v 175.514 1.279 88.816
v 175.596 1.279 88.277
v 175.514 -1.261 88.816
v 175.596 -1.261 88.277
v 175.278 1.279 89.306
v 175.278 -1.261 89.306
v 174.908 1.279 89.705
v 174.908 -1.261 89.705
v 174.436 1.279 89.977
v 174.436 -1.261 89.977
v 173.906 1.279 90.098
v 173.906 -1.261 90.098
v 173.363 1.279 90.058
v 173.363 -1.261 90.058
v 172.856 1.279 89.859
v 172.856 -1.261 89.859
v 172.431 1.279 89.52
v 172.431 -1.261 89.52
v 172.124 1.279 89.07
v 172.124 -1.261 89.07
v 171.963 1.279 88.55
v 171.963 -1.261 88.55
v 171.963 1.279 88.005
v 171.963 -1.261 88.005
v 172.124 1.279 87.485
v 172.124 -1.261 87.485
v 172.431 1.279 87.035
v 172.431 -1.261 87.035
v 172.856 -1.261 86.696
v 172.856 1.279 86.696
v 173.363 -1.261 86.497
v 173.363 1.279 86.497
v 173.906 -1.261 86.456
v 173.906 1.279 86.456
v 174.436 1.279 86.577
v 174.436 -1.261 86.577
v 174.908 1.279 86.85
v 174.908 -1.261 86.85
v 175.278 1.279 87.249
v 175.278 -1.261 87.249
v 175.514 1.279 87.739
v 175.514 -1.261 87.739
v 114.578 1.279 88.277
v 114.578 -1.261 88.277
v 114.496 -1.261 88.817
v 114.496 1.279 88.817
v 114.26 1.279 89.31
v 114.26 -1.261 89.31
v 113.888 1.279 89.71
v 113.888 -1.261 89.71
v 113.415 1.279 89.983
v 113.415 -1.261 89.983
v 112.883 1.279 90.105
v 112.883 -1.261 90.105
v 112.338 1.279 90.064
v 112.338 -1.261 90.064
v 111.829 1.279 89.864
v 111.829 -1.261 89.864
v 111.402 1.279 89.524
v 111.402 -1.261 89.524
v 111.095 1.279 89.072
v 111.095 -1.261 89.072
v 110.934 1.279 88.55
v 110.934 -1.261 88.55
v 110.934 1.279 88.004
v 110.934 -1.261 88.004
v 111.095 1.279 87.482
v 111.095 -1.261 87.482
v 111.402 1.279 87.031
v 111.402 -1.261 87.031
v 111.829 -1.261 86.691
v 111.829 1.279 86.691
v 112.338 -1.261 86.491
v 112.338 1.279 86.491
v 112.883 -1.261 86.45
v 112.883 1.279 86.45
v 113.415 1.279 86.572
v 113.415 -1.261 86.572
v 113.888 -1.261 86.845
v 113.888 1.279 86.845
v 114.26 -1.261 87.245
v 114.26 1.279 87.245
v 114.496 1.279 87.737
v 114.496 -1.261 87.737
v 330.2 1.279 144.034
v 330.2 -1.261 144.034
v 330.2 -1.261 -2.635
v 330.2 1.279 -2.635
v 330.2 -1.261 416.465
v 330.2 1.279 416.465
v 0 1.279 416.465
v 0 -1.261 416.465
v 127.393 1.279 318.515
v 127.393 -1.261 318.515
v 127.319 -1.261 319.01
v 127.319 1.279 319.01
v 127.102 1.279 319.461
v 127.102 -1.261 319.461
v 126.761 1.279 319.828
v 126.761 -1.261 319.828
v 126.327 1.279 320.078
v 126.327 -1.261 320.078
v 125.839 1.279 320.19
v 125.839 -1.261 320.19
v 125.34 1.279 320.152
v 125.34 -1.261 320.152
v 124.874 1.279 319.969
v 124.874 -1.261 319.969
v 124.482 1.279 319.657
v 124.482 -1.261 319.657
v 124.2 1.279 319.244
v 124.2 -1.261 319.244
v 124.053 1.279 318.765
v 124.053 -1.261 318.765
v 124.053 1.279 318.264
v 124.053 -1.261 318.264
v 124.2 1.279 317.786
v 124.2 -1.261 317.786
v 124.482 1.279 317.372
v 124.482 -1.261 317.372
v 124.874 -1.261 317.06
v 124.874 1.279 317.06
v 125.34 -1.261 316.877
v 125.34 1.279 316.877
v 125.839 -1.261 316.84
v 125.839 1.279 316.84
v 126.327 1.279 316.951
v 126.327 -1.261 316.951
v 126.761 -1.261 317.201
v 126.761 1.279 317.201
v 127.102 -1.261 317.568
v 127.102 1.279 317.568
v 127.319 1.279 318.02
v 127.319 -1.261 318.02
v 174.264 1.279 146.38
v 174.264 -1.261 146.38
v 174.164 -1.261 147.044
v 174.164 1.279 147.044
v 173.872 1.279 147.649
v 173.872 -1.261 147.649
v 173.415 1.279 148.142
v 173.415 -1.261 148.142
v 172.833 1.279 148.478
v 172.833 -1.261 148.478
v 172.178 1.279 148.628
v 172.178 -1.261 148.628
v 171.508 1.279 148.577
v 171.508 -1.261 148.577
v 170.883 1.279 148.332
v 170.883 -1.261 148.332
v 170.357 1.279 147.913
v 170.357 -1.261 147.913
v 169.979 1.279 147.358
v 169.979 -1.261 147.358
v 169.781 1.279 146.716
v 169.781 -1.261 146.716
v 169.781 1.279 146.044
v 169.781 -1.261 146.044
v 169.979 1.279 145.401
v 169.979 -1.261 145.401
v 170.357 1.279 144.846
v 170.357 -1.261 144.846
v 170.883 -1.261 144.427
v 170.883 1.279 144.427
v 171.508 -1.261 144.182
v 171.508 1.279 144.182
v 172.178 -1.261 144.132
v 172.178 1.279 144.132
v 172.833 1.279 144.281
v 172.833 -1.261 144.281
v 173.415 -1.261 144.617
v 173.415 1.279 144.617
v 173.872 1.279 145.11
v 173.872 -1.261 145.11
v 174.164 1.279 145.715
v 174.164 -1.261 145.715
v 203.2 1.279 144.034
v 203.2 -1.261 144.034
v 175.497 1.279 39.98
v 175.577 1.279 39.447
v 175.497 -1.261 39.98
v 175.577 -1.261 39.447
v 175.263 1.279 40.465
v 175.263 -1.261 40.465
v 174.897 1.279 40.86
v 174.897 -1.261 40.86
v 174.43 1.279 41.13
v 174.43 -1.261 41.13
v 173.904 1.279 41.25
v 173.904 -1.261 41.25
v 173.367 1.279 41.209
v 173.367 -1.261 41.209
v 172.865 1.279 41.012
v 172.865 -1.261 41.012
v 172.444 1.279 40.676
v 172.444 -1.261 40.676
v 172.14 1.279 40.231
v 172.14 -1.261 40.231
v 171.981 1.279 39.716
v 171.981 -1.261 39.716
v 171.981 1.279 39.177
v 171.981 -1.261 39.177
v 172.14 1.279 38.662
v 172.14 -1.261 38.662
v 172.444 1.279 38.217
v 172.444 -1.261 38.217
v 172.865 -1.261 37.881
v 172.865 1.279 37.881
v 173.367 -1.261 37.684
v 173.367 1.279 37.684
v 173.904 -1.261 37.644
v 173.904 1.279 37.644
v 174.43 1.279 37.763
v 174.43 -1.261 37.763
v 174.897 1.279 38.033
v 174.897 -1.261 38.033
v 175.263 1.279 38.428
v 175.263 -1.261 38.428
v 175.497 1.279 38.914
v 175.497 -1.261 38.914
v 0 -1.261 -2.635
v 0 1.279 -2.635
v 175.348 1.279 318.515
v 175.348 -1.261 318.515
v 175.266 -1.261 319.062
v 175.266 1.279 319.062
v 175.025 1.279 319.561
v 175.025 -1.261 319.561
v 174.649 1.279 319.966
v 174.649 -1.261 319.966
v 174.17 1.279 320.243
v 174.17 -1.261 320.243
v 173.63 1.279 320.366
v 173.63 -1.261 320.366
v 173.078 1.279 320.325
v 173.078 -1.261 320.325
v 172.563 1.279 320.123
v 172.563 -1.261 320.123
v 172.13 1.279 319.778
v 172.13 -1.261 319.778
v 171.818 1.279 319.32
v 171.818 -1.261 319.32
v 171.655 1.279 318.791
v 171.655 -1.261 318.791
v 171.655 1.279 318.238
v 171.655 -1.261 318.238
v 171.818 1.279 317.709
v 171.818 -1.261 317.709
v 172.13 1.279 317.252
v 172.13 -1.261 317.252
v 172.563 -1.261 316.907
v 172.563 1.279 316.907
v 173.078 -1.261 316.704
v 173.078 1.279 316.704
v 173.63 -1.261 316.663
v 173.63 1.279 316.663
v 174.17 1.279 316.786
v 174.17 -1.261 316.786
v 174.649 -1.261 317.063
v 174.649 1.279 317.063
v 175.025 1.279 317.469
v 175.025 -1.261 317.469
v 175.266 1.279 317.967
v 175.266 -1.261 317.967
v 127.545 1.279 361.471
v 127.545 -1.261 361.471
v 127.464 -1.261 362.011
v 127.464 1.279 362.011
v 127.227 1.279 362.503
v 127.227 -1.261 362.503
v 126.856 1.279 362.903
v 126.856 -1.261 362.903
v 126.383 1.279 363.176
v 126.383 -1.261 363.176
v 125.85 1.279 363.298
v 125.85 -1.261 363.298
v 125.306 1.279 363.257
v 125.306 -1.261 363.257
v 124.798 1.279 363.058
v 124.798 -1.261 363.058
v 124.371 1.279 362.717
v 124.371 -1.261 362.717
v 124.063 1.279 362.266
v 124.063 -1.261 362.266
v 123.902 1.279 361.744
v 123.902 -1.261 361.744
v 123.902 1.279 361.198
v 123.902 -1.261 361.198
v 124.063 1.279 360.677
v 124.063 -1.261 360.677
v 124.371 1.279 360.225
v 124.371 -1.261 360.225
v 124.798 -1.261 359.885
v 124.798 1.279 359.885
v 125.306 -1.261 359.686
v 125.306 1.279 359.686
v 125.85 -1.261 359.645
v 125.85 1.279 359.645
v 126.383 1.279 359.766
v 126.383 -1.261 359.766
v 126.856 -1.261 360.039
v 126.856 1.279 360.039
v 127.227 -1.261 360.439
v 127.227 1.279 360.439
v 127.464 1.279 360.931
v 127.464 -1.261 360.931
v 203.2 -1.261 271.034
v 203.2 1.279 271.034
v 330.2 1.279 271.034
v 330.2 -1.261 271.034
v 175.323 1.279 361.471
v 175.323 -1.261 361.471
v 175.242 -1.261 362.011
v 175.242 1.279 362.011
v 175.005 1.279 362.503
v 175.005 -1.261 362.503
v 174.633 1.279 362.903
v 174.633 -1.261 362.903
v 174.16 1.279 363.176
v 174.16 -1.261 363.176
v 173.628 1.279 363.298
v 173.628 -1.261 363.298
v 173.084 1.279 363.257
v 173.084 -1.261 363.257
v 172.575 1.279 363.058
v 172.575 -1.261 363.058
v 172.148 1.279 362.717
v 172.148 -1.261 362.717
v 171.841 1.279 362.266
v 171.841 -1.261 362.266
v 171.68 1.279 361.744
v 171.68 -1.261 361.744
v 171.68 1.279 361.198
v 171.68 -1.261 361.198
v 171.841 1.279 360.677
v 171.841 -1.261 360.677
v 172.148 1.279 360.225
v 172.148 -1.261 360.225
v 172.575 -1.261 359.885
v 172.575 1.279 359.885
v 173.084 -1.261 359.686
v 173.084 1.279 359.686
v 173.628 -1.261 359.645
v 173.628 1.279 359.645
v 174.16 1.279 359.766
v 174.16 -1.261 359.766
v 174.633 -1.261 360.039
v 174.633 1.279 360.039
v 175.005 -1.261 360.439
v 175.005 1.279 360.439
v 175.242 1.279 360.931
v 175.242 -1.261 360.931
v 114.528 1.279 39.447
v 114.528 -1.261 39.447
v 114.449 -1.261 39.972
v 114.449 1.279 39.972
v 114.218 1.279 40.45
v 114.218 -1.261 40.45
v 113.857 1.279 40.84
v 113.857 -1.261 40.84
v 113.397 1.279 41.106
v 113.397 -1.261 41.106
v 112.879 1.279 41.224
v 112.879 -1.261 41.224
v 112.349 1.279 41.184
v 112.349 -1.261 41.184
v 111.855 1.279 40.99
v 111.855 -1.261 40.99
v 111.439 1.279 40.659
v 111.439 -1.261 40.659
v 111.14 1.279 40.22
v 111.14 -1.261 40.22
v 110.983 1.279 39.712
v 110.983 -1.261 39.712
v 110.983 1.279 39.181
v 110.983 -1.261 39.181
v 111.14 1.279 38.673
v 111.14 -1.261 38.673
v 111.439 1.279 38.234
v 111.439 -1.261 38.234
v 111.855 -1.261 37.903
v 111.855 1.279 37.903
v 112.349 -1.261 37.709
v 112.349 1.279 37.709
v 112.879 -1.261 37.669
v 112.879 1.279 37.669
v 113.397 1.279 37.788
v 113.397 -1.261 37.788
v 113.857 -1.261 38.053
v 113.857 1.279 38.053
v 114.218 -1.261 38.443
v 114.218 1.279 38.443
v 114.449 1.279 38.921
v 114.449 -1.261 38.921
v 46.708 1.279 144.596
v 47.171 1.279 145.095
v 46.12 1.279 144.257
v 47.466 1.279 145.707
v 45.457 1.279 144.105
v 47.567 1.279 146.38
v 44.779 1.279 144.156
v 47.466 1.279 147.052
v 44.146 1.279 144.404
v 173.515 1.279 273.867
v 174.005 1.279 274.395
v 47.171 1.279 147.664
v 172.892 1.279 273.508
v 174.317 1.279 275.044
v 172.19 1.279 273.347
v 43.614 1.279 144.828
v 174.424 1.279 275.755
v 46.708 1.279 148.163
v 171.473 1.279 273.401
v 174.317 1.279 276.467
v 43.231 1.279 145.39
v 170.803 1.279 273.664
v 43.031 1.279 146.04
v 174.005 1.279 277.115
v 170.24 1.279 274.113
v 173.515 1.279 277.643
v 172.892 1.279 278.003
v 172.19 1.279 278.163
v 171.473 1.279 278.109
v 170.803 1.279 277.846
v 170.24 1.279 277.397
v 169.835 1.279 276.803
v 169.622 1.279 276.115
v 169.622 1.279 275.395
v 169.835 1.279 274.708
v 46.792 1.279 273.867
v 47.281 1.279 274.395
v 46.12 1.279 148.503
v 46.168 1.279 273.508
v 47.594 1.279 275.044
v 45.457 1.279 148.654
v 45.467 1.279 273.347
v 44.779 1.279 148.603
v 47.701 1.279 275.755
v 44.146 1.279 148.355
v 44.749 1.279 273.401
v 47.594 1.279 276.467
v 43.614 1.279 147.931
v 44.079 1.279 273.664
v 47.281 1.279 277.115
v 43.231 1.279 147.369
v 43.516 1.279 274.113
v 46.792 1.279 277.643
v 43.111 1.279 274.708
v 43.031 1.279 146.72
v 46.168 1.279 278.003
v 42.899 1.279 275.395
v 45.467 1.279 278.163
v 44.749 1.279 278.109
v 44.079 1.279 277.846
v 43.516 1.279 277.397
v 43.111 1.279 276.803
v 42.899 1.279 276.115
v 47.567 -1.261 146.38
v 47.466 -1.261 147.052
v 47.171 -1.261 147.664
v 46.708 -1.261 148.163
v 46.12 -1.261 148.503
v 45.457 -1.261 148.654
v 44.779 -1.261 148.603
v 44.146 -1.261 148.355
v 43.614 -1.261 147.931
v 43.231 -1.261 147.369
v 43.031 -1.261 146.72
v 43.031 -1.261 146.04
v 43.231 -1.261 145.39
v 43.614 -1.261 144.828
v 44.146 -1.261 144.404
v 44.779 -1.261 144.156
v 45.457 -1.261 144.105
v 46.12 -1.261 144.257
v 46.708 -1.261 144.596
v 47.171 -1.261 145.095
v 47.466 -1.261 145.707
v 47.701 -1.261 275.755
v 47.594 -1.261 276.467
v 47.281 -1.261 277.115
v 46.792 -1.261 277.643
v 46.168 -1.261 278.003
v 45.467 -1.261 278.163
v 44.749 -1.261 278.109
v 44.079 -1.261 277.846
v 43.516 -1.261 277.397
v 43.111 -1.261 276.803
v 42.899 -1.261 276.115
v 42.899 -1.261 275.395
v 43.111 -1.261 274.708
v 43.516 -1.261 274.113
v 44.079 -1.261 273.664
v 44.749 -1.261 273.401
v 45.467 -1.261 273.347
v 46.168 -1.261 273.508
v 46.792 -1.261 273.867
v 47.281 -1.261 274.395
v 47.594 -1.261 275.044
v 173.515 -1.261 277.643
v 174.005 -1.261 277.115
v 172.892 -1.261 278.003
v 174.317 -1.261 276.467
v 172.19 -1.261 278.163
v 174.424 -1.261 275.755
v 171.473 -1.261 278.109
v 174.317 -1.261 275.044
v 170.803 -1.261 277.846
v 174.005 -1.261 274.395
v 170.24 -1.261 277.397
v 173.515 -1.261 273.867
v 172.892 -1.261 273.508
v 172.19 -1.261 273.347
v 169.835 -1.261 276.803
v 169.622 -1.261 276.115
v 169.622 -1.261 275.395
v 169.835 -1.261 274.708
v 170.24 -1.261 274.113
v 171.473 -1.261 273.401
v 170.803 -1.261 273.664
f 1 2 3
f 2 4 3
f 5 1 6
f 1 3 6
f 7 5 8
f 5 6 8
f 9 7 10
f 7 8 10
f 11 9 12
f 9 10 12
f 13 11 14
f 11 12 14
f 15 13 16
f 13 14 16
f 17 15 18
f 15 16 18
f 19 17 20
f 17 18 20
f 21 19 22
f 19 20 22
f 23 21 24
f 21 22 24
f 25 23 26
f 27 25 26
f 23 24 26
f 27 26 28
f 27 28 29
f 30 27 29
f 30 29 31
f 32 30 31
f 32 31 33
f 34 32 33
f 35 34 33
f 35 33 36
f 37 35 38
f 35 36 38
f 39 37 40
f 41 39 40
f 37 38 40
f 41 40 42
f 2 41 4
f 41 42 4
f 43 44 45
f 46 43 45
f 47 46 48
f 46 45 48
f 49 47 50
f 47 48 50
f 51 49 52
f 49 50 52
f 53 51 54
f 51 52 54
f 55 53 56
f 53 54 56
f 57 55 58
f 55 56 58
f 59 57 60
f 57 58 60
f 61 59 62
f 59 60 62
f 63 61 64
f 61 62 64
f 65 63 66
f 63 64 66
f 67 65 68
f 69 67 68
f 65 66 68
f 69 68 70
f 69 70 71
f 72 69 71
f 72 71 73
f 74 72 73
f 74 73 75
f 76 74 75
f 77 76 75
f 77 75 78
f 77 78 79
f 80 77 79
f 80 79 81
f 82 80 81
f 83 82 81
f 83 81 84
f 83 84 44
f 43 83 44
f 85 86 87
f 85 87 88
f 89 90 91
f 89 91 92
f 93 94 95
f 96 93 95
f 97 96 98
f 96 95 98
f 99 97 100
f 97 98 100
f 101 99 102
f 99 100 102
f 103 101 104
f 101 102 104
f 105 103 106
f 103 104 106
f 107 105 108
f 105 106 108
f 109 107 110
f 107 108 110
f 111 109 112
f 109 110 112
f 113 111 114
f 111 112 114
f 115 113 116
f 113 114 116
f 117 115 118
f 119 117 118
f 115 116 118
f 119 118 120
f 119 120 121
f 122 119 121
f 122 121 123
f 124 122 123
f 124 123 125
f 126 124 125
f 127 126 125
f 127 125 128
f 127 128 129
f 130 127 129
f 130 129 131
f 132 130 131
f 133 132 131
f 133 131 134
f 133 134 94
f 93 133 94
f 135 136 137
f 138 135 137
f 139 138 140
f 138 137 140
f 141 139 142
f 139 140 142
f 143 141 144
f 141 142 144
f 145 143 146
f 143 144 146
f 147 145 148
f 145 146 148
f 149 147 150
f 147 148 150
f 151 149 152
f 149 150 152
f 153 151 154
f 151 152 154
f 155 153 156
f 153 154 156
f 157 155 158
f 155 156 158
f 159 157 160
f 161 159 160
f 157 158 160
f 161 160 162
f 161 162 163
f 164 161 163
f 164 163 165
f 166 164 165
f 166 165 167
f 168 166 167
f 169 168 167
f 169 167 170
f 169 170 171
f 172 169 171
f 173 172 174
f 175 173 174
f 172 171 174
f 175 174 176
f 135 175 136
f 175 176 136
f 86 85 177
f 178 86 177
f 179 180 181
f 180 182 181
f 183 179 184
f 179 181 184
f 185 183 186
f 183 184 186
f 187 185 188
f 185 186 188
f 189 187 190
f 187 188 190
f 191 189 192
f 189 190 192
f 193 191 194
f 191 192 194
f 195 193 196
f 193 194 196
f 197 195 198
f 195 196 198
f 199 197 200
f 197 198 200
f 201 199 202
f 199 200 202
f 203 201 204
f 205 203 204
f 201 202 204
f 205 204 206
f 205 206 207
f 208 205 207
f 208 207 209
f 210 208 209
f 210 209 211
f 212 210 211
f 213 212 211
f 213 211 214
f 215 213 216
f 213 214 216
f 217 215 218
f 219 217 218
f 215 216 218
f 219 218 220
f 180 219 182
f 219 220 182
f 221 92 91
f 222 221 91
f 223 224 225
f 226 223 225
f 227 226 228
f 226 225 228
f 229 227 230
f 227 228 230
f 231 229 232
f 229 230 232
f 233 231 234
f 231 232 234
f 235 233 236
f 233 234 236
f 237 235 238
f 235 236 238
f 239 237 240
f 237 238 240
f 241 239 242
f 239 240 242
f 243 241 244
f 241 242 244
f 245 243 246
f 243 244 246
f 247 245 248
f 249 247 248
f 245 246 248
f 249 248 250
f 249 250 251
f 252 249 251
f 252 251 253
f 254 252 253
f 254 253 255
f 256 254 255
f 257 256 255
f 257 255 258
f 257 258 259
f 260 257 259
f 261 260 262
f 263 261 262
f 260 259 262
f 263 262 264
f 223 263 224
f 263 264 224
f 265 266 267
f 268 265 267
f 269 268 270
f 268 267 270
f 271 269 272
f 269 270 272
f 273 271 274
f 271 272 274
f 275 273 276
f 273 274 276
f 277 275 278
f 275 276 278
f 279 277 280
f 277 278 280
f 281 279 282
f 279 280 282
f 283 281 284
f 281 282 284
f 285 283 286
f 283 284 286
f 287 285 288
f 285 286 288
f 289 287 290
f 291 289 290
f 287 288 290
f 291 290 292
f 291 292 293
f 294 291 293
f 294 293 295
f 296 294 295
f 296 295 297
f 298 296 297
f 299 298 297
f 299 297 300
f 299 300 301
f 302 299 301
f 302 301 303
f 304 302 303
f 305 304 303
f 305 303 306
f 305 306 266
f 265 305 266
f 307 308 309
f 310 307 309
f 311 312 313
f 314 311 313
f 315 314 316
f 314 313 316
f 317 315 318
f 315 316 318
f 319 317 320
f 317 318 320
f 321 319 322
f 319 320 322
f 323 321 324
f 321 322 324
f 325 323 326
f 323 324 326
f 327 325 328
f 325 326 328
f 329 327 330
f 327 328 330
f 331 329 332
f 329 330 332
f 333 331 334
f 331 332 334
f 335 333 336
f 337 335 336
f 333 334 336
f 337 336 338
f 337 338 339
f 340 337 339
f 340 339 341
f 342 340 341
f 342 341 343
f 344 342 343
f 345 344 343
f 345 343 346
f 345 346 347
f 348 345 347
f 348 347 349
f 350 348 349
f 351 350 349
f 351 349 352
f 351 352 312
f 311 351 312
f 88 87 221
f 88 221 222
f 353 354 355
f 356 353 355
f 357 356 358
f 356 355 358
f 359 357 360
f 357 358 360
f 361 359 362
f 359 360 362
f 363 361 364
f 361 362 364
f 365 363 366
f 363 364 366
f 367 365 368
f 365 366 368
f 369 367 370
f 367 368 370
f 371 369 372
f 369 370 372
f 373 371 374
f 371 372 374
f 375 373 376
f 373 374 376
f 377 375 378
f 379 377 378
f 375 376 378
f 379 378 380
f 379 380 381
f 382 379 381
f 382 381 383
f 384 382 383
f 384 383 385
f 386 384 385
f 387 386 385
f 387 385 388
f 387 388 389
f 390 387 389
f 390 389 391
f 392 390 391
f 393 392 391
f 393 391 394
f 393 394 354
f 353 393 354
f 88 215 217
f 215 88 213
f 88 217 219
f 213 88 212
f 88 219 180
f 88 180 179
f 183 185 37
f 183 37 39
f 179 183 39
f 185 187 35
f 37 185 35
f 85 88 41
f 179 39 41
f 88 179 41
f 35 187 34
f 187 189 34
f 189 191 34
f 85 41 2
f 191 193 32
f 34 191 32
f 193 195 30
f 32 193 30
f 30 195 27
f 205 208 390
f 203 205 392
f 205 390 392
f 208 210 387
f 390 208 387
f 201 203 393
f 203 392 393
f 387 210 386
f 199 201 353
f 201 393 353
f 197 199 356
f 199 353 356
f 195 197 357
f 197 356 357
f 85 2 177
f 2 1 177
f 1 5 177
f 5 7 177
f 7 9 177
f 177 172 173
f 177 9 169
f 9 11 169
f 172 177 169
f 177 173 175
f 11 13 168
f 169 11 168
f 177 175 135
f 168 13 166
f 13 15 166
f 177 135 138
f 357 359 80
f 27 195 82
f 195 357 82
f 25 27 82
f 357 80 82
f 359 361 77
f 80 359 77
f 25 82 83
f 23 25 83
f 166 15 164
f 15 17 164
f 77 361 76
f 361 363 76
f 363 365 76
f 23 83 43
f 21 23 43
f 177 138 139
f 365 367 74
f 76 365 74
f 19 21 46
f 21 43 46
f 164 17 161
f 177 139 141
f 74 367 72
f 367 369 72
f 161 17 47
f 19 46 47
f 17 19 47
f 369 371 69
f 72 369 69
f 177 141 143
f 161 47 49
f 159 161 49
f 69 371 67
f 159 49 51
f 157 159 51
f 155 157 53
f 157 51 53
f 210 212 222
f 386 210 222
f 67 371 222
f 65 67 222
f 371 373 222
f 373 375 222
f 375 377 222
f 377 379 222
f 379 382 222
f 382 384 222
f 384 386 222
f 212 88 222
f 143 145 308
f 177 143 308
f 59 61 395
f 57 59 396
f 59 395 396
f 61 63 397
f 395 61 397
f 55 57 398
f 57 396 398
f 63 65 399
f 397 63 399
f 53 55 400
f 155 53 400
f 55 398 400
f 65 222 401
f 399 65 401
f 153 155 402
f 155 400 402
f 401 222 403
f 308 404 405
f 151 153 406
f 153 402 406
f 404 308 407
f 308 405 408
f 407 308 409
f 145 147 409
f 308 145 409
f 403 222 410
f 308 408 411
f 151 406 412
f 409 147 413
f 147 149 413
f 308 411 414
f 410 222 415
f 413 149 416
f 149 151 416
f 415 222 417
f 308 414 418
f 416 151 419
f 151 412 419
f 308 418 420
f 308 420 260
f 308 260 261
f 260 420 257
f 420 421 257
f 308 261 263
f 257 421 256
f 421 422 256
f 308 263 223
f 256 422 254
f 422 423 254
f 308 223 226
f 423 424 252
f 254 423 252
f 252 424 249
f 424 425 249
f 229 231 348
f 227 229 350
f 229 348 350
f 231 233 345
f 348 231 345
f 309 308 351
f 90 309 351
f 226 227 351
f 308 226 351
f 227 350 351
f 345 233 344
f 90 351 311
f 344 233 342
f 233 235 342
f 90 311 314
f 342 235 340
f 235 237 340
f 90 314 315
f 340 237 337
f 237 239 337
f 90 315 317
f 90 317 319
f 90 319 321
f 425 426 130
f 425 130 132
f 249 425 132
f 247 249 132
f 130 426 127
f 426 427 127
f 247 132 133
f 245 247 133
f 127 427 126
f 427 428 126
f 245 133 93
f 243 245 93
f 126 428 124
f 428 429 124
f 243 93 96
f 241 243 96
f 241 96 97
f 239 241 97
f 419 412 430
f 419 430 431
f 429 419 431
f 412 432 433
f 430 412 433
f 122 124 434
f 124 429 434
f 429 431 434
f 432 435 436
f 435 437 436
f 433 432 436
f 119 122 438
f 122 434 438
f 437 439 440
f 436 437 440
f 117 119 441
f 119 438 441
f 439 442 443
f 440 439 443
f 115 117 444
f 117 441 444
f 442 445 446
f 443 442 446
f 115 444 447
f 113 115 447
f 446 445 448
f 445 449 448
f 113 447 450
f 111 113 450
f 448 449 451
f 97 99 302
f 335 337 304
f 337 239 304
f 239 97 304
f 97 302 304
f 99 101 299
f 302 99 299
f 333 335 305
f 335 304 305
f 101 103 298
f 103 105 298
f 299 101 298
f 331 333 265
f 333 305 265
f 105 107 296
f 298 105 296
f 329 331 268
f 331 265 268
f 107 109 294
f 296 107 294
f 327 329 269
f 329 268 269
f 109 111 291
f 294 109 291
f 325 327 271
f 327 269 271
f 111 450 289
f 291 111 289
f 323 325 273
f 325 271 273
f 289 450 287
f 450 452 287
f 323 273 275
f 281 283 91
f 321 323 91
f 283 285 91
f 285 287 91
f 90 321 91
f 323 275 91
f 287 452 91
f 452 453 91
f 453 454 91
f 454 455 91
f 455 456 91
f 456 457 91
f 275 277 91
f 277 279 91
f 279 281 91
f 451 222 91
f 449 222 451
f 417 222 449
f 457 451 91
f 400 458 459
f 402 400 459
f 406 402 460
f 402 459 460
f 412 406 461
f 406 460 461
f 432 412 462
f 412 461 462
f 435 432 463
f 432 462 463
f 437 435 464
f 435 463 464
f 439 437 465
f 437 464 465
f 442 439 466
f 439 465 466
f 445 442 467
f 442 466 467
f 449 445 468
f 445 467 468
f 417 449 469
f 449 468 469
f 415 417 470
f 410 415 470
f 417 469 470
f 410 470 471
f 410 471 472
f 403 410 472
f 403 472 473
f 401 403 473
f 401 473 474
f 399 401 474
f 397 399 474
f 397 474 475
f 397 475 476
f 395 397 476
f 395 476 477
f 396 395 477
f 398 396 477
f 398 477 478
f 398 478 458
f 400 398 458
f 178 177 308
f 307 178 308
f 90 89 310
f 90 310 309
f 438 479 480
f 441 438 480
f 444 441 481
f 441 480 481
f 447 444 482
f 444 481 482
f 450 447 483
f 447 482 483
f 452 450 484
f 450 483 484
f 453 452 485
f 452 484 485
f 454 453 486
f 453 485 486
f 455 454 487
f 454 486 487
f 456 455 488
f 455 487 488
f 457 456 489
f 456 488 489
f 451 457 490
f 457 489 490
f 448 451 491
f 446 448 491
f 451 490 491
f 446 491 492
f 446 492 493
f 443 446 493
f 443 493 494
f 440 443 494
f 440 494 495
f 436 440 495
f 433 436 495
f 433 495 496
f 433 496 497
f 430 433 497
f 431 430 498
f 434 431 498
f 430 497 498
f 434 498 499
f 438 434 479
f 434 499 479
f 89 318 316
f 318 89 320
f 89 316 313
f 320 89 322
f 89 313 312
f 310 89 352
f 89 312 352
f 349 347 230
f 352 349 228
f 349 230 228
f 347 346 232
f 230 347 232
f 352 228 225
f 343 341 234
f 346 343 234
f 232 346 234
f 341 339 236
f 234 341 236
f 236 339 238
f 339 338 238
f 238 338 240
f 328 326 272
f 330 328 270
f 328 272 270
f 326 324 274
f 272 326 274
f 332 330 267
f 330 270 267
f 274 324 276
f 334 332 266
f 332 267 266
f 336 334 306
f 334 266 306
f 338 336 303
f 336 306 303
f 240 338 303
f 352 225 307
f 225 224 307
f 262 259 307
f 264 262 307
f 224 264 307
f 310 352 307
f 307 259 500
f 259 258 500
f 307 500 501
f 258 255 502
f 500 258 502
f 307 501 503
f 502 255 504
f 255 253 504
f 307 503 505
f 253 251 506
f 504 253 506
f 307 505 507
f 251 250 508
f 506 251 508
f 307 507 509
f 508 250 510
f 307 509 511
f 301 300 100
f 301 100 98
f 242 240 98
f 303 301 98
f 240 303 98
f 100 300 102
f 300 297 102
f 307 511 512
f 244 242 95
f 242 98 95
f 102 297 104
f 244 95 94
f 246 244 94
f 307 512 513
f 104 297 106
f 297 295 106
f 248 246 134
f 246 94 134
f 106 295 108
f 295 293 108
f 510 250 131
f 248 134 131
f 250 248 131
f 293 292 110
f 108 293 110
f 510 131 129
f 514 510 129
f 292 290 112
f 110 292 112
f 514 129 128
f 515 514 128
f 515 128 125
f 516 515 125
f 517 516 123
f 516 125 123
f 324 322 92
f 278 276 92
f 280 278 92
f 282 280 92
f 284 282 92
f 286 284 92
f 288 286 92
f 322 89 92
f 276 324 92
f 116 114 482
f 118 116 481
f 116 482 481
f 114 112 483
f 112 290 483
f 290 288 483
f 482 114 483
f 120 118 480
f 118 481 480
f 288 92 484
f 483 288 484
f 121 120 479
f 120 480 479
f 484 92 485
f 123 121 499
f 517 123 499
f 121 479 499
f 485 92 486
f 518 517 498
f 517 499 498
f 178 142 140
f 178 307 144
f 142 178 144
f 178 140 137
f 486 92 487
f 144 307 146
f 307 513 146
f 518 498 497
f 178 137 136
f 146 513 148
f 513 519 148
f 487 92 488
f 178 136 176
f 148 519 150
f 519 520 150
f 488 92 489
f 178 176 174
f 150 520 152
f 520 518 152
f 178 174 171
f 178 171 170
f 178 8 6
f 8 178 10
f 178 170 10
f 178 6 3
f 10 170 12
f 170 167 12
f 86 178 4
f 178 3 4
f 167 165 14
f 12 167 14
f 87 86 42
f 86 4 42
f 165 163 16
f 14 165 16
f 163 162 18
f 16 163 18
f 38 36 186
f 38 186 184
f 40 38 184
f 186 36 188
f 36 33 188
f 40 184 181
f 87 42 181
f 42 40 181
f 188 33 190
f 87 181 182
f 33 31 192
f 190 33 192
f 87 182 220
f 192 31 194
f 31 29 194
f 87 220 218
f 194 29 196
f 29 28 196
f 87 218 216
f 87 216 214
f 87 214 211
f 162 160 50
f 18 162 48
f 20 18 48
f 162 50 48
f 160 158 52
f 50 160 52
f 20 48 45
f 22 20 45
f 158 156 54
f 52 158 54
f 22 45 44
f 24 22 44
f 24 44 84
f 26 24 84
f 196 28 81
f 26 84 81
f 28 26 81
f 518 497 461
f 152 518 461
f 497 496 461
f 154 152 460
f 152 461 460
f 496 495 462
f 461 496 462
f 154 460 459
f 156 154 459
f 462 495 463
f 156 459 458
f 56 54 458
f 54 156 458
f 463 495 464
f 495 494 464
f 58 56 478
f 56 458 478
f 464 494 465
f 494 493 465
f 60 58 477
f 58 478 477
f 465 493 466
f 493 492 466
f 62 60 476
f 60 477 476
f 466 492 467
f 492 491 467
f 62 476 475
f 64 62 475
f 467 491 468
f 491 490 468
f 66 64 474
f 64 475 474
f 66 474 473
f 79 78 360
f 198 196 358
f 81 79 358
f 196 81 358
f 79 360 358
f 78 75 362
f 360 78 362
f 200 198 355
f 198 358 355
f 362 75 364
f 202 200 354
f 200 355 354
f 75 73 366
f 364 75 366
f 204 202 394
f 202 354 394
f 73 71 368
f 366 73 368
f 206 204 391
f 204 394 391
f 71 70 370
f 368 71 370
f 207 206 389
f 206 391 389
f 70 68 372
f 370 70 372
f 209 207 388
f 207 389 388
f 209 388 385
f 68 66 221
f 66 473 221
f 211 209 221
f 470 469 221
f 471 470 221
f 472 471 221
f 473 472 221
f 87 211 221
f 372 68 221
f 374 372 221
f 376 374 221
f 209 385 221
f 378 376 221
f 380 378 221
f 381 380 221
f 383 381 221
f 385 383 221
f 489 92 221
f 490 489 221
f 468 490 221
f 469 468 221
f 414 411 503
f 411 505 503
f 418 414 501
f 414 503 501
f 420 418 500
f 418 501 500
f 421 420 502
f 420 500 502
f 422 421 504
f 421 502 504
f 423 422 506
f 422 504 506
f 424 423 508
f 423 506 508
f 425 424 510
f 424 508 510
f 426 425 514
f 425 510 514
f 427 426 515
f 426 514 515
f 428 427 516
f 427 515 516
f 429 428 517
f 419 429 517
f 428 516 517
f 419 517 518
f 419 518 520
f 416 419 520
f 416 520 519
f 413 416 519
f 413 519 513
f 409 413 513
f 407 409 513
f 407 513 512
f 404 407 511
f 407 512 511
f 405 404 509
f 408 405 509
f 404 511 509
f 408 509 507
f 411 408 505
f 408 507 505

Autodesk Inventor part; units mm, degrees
ref_plane "YZ Plane" through (0, 0, 0) normal (1, 0, 0) x (0, 1, 0)
ref_plane "XZ Plane" through (0, 0, 0) normal (0, 1, 0) x (-1, 0, 0)
ref_plane "XY Plane" through (0, 0, 0) normal (0, 0, 1) x (1, 0, 0)
sketch "Sketch1" plane through (0, 0, 0) normal (1, 0, 0) x (0, 1, 0)
  line L0 (1.2792, 416.4647) -> (-1.2608, 416.4647)
  line L1 (-1.2608, 416.4647) -> (-1.2608, -2.6353)
  line L2 (-1.2608, -2.6353) -> (1.2792, -2.6353)
  line L3 (1.2792, -2.6353) -> (1.2792, 416.4647)
  point P0 (0, 0)
  dimension "d0" = 2.54
  dimension "d1" = 419.1
extrude "Extrusion1" add sketch "Sketch1" along normal blind 330.2
sketch "Sketch2" plane through (0, -1.2608, -2.6353) normal (0, -1, 0) x (1, 0, 0)
  circle A0 centre (173.4912, 364.1066) radius 1.8317
  circle A1 centre (173.4912, 321.15) radius 1.8569
  circle A2 centre (125.7136, 321.15) radius 1.6798
  circle A3 centre (125.7136, 364.1066) radius 1.8317
  circle A4 centre (172.0099, 278.3905) radius 2.4145
  circle A5 centre (172.0099, 149.0149) radius 2.2543
  circle A6 centre (45.2863, 149.0149) radius 2.2807
  circle A7 centre (45.2863, 278.3905) radius 2.4145
  circle A8 centre (173.7693, 90.9127) radius 1.8262
  circle A9 centre (173.7693, 42.0819) radius 1.8081
  circle A10 centre (112.7456, 42.0819) radius 1.7821
  circle A11 centre (112.7456, 90.9127) radius 1.8323
  point P0 (0, 2.6353)
extrude "Extrusion2" cut sketch "Sketch2" against normal up to surface (2.54 mm away)
sketch "Sketch3" plane through (0, 1.2792, 416.4647) normal (0, 1, 0) x (1, 0, 0)
  line L0 (266.7, 209.1248) -> (266.7, 419.1) construction
  line L1 (0, 419.1) -> (330.2, 419.1) projected
  line L2 (266.7, 209.1248) -> (266.7, -0.8504) construction
  line L3 (330.2, 0) -> (330.2, 419.1) projected
  line L4 (330.2, 272.4308) -> (203.2, 272.4308)
  line L5 (203.2, 272.4308) -> (203.2, 145.4308)
  line L6 (203.2, 145.4308) -> (330.2, 145.4308)
  line L7 (330.2, 145.4308) -> (330.2, 272.4308)
  line L8 (330.2, 208.9308) -> (203.2, 208.9308) construction
  point P0 (0, 416.4647)
  dimension "d10" = 127
  dimension "d11" = 127
  dimension "d12" = 63.5
extrude "Extrusion4" cut sketch "Sketch3" against normal up to surface (2.54 mm away)
properties part number "Small Wall" material "Polycarbonate, Clear"
